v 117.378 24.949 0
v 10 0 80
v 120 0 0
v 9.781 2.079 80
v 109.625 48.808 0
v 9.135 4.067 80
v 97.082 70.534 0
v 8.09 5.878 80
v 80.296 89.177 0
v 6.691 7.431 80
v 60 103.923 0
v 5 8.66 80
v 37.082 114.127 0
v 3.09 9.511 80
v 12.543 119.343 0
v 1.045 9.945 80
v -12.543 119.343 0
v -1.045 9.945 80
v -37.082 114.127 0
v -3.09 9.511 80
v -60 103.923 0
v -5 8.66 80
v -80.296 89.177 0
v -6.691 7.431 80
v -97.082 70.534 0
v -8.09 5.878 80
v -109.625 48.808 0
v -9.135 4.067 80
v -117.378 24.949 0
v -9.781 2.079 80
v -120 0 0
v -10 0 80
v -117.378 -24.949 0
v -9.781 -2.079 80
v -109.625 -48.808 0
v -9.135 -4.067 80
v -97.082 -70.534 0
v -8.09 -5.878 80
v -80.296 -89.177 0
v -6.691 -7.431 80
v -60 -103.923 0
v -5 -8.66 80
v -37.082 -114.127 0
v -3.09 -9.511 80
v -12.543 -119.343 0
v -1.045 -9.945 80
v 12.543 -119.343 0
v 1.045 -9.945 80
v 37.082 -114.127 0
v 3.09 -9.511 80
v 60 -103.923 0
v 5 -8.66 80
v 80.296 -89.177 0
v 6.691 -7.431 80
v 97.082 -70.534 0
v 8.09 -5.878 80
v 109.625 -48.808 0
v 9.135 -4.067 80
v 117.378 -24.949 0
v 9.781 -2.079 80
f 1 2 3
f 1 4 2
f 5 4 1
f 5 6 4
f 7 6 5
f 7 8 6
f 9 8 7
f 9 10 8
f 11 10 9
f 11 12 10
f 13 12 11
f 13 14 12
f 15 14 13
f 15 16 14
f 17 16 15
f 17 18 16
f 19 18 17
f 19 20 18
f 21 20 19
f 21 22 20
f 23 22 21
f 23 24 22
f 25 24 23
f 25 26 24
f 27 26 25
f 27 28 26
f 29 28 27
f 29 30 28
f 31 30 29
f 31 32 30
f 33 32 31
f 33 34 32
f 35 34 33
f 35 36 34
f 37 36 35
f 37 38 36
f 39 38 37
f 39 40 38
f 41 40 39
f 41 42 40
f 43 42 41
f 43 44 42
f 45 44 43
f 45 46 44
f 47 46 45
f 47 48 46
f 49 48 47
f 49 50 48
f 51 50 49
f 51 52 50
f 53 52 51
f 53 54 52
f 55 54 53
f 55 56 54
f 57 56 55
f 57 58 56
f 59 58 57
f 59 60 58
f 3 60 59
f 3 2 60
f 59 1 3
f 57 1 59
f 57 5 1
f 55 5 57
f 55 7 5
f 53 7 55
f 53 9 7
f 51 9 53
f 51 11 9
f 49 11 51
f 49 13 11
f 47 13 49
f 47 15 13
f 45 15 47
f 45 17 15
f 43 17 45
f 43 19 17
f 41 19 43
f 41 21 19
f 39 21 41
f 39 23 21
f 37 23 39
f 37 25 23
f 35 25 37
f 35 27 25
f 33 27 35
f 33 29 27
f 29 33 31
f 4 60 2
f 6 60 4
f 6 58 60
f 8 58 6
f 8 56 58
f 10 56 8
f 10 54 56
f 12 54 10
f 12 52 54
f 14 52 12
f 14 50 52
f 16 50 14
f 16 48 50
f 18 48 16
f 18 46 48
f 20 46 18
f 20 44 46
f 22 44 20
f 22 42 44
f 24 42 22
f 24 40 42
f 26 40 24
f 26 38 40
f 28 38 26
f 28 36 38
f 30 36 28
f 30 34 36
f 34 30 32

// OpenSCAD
module example005()
{

			cylinder(h = 80, r1 = 120, r2 = 10);

}

example005();
